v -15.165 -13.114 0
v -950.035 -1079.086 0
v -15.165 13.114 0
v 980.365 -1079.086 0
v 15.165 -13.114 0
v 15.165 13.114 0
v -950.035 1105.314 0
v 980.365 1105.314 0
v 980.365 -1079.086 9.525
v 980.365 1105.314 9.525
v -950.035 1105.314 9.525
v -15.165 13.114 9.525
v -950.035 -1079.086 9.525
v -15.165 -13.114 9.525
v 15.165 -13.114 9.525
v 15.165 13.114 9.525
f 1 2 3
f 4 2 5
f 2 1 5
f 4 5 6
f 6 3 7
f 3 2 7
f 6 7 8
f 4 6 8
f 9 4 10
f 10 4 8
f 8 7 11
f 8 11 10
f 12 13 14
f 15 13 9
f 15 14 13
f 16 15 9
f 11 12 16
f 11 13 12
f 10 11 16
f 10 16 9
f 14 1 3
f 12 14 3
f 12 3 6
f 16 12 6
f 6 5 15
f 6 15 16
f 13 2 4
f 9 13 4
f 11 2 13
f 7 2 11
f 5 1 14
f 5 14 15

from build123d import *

# Parameters (mm, degrees)
F0_W     = 1930.4
F0_H     = 2184.4
F0_W_2   = 30.330142
F0_H_2   = 26.228558
F1_DEPTH = 9.525


with BuildPart() as f1:
    # F0 (on Top) → F1 (new body)
    with BuildSketch(Plane.XY):
        with Locations((15.165071, 13.114279)):
            Rectangle(F0_W, F0_H)
        Rectangle(F0_W_2, F0_H_2, mode=Mode.SUBTRACT)
    extrude(amount=F1_DEPTH)


solid = f1.part
